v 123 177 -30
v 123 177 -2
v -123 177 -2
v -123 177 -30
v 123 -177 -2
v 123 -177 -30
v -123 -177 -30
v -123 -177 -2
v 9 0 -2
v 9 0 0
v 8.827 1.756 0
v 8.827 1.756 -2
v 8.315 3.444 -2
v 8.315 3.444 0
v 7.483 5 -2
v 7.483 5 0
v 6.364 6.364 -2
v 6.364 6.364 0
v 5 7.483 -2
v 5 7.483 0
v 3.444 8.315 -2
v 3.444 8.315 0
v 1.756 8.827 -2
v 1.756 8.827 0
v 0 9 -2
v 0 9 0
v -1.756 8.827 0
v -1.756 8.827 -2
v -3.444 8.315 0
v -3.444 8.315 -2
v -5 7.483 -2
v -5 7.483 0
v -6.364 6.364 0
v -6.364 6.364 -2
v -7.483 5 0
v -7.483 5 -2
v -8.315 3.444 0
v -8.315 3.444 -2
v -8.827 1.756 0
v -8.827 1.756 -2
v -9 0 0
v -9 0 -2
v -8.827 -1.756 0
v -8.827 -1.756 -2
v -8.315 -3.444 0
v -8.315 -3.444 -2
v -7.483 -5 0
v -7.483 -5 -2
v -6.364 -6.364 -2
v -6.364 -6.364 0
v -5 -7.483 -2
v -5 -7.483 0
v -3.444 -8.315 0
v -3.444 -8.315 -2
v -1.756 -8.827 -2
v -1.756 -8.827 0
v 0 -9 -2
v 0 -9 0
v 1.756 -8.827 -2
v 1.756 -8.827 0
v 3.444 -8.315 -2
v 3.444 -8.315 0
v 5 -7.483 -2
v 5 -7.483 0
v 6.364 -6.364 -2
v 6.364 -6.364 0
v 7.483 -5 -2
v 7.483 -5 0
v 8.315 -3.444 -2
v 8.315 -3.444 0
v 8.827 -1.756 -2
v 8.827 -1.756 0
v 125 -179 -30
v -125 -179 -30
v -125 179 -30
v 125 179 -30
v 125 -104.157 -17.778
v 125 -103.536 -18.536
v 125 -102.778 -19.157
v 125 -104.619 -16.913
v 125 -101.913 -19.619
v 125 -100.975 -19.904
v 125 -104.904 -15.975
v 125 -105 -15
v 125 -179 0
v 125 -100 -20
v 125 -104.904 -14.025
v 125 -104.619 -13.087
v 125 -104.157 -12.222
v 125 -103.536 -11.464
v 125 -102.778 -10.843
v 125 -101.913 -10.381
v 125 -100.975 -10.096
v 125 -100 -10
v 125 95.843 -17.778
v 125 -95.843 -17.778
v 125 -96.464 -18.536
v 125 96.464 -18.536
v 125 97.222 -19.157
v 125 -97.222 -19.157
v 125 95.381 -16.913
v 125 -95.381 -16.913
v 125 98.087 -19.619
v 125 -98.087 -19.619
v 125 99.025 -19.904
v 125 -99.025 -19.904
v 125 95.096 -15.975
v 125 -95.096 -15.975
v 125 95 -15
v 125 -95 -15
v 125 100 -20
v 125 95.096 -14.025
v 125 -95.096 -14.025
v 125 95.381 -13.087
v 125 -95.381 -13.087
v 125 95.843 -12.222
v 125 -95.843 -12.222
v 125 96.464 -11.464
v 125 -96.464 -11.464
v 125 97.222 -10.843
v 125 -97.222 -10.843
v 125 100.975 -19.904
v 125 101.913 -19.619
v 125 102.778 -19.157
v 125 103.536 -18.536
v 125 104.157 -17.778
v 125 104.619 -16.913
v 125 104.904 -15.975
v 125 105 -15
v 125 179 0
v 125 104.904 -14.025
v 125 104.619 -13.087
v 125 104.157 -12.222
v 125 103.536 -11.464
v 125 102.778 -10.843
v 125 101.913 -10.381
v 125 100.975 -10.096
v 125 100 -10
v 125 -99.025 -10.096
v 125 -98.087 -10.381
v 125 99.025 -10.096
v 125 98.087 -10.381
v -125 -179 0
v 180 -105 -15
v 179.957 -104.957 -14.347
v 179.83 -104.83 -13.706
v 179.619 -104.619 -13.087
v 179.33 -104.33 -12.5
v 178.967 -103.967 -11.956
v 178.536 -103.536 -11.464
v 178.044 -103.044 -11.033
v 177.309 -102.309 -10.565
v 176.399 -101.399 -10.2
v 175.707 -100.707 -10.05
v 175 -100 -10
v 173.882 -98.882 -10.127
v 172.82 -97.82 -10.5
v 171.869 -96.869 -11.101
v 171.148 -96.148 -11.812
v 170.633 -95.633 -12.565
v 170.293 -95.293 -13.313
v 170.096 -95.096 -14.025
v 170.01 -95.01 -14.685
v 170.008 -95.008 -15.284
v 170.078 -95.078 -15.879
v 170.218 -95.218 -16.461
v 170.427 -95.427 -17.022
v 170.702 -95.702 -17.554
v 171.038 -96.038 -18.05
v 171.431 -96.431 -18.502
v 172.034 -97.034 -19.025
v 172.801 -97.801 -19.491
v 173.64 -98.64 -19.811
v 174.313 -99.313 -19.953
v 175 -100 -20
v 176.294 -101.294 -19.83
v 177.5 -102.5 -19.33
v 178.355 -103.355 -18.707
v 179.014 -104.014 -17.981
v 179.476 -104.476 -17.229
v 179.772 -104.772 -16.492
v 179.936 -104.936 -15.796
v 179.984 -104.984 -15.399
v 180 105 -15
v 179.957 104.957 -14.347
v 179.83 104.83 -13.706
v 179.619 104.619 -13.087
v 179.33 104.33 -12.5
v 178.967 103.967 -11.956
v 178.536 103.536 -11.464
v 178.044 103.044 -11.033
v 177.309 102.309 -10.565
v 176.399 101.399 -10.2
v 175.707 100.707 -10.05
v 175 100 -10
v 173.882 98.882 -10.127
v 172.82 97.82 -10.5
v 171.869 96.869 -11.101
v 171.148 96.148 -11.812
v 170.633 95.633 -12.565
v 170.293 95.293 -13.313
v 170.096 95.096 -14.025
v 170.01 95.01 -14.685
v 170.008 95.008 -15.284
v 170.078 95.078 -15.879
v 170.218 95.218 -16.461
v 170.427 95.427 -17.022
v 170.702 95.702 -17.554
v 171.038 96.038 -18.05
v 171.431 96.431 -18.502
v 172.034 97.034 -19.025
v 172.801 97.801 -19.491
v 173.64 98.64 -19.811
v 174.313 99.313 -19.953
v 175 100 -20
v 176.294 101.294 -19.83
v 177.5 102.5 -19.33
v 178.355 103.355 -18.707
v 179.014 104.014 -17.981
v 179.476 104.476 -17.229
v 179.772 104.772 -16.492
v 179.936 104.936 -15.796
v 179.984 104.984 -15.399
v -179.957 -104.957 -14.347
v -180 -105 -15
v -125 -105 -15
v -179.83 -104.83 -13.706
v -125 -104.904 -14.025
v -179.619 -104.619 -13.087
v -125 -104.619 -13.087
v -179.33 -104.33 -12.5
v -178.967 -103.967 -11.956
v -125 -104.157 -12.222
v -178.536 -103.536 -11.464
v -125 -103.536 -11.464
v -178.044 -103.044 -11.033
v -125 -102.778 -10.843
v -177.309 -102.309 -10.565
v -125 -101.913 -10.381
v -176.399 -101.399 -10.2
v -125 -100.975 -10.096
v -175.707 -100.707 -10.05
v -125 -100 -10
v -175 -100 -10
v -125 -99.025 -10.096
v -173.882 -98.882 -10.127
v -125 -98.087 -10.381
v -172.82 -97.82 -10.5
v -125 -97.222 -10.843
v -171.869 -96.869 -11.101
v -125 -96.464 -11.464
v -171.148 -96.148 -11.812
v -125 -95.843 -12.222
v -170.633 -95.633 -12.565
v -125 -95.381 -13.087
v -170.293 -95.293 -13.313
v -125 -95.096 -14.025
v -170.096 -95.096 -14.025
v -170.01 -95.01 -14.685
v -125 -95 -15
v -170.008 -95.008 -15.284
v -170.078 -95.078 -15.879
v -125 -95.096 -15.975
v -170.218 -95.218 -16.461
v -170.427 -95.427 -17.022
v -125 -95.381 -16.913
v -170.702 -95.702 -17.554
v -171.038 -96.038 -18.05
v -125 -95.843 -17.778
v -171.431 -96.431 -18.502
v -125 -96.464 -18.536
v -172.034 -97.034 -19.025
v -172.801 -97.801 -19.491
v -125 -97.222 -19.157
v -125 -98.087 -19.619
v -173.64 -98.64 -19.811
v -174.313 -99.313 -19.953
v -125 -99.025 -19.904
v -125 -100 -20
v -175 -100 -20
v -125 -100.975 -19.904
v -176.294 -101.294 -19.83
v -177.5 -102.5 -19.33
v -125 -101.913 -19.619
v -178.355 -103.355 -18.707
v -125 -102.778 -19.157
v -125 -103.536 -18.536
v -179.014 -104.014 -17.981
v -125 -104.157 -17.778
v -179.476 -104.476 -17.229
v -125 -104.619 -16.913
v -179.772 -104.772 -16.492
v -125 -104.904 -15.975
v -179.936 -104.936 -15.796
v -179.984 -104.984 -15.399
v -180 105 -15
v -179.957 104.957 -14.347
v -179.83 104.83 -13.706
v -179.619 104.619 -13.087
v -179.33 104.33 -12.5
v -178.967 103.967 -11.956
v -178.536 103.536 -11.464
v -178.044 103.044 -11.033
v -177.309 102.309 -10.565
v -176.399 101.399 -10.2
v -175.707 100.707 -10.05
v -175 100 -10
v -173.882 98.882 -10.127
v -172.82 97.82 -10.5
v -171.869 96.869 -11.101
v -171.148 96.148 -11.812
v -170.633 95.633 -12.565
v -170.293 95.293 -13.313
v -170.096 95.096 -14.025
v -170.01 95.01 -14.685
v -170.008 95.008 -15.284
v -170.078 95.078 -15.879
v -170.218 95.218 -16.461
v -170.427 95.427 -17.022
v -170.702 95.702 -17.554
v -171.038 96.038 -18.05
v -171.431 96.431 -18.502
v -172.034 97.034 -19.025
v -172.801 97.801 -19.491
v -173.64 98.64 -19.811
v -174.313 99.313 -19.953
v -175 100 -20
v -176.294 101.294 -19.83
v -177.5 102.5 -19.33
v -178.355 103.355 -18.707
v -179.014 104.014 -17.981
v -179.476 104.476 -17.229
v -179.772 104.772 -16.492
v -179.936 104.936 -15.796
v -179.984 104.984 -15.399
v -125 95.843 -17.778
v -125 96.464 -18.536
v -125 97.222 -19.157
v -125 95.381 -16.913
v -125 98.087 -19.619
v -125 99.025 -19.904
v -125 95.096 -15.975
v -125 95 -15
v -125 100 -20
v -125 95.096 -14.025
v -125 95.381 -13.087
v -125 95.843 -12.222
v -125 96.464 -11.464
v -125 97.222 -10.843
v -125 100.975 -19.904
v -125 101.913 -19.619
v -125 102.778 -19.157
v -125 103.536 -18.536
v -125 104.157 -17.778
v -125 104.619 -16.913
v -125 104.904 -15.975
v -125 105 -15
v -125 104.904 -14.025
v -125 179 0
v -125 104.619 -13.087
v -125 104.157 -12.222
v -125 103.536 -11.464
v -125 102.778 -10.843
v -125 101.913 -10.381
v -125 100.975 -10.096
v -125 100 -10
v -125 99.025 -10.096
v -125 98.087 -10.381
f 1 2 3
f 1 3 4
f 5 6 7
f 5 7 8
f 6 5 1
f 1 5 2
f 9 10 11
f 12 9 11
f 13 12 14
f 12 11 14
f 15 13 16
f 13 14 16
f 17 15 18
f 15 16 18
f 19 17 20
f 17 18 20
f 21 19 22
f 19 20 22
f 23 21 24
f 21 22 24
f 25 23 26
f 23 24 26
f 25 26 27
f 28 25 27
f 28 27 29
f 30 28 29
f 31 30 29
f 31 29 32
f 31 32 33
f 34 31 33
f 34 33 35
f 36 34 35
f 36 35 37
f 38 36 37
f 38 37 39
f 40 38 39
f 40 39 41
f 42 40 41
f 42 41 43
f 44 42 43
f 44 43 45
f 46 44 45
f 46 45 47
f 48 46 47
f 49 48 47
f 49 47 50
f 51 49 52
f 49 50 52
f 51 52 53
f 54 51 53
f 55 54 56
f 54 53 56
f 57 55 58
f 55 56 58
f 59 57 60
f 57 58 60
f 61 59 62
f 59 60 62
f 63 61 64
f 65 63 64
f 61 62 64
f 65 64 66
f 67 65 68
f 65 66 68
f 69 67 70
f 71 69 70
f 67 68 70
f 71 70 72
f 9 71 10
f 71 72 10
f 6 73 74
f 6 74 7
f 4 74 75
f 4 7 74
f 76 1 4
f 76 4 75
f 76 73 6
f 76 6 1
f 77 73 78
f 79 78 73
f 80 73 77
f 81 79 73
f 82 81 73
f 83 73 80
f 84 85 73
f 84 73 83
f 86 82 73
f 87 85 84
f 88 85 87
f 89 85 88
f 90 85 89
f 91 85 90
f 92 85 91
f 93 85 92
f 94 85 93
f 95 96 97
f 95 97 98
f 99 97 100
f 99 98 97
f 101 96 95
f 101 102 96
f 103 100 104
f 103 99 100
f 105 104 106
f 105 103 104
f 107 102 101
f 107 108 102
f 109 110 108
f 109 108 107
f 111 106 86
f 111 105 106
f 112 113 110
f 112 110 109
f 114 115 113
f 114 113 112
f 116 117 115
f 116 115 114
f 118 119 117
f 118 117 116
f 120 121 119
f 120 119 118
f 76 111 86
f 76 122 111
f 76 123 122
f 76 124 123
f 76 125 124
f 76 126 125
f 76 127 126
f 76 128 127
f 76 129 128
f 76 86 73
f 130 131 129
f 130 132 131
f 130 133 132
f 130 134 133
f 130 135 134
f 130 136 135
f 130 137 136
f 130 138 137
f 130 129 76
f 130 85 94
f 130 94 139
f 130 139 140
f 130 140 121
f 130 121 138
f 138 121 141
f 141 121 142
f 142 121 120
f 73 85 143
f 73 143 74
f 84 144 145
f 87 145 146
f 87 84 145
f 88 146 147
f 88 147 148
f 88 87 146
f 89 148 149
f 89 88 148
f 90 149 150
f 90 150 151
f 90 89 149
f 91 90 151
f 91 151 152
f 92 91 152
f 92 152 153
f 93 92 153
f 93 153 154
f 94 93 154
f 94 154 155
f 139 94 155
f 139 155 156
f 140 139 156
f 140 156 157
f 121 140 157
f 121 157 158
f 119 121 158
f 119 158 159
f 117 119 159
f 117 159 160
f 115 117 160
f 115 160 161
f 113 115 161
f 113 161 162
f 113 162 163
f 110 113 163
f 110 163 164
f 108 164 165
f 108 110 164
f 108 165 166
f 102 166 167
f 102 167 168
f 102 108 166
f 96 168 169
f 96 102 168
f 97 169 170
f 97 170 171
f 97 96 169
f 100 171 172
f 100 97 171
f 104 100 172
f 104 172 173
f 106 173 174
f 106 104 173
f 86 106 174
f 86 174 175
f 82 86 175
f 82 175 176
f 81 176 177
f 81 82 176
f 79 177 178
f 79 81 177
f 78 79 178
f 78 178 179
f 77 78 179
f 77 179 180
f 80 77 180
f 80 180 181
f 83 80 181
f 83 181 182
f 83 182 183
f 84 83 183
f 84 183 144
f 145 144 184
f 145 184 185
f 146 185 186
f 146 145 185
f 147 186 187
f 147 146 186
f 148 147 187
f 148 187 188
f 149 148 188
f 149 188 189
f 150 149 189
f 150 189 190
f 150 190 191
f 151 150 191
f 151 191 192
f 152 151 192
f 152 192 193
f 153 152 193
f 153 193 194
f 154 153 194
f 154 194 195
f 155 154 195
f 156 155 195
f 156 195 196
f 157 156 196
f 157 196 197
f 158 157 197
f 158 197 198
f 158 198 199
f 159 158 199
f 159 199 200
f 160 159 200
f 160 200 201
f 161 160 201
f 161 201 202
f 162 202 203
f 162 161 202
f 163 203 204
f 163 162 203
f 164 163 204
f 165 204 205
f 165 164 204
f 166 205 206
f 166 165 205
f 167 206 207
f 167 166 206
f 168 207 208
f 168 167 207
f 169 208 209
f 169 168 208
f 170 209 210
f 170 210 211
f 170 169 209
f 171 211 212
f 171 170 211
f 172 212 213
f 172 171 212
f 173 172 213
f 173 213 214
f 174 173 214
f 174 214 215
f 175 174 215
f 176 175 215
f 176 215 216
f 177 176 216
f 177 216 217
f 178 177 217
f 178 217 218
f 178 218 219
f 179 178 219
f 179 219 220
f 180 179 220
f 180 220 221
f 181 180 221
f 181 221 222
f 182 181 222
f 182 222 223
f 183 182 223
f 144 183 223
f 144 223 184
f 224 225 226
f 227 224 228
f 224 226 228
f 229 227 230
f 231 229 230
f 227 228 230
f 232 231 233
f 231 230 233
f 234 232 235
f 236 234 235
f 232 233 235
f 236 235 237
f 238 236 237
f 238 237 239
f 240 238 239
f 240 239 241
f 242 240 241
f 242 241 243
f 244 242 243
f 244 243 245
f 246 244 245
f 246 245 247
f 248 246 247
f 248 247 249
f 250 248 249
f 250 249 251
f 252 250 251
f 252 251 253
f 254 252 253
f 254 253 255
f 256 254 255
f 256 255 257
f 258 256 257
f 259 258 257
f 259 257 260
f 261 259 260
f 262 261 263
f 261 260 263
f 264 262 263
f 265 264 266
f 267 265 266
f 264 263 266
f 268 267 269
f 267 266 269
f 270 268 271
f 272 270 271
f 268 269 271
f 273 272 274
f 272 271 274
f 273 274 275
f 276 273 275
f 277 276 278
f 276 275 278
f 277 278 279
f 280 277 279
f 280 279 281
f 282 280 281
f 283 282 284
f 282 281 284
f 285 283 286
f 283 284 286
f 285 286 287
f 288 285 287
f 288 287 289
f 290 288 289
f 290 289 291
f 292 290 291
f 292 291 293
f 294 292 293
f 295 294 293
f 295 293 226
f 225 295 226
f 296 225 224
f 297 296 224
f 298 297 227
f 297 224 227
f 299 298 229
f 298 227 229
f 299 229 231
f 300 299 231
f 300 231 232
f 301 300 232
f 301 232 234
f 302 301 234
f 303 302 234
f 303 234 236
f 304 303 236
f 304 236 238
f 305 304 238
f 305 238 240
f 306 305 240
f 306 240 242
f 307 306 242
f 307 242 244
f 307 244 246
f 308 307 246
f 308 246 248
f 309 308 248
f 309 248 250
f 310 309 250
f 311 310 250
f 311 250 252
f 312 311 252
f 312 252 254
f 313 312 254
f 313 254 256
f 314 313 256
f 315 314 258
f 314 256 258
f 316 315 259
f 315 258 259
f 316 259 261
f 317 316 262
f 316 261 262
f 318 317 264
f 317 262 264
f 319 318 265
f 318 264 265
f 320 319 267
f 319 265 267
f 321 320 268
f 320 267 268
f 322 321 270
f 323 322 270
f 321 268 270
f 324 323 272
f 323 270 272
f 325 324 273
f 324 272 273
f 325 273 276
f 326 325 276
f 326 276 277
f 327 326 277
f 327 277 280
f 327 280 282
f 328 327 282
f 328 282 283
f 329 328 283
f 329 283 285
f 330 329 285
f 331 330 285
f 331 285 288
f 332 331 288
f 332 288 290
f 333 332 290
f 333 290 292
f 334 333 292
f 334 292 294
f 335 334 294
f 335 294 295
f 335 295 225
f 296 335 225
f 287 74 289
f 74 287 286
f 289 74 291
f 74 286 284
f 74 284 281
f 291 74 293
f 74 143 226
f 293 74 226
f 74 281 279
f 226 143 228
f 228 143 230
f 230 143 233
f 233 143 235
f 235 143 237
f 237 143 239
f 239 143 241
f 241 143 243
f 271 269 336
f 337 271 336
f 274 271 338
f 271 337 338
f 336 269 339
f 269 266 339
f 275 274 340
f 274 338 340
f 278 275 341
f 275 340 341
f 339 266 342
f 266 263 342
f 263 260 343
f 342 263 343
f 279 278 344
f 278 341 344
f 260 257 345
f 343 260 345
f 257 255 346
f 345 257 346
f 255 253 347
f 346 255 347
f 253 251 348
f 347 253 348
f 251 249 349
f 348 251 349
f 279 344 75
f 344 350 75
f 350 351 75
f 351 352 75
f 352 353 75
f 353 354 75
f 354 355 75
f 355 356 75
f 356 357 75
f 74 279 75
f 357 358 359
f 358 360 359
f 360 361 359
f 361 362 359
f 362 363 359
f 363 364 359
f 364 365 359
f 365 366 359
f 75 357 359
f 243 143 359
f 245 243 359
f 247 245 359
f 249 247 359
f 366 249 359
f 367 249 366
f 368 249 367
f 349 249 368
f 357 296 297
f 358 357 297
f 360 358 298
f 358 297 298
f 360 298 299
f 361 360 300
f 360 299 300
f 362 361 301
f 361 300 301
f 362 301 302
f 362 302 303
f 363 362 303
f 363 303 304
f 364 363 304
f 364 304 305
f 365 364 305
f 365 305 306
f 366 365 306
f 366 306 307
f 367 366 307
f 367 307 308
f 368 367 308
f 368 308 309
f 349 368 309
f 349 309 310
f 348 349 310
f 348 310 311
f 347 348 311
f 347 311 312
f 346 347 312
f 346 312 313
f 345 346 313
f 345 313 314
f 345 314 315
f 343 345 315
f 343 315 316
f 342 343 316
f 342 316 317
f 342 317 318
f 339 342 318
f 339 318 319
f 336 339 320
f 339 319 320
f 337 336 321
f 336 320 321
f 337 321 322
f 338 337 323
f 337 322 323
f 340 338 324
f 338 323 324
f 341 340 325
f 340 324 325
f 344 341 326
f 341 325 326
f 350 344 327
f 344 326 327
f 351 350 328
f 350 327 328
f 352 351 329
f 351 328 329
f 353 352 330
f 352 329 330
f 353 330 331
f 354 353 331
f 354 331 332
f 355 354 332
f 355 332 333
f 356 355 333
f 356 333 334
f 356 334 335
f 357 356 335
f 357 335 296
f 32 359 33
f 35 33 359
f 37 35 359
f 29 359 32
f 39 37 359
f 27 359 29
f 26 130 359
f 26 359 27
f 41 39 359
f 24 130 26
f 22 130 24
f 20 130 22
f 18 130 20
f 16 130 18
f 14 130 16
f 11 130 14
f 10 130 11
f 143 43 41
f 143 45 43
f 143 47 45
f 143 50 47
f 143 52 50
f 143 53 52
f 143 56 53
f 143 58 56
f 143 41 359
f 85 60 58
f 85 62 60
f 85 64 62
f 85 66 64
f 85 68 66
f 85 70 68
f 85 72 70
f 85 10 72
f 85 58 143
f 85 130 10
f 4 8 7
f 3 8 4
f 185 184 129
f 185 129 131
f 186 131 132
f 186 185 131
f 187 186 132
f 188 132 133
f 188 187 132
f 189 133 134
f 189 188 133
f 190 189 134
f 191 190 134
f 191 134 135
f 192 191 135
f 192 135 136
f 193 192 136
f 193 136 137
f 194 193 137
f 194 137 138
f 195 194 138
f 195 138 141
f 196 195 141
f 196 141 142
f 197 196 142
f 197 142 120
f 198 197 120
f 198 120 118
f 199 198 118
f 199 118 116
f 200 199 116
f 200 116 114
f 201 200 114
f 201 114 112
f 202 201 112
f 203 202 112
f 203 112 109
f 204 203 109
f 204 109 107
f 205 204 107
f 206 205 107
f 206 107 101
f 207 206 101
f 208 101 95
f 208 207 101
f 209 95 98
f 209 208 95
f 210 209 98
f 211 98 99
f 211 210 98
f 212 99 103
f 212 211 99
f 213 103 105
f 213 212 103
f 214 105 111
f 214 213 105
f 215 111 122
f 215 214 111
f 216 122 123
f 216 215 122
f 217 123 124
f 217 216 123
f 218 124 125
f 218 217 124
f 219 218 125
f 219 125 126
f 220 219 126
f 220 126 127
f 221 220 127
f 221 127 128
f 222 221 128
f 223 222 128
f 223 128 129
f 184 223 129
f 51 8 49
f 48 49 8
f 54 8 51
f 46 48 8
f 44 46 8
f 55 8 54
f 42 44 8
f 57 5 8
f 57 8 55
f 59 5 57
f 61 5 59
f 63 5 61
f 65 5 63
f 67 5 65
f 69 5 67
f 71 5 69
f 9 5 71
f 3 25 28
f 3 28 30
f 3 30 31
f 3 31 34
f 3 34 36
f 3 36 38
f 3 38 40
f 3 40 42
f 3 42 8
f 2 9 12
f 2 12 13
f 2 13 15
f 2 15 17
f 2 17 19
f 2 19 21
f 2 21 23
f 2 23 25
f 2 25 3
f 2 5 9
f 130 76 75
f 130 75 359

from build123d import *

# Parameters (mm, degrees)
F1_DEPTH  = 125
F4_DEPTH  = 2
F10_R     = 9
F11_DEPTH = 25


with BuildPart() as f1:
    # F0 (on Right) → F1 (new body)
    with BuildSketch(Plane.YZ):
        Polygon((179, 0), (0, 0), (0, -2), (177, -2), (177, -30), (179, -30), align=None)
        Polygon((0, -2), (0, 0), (-179, 0), (-179, -30), (-177, -30), (-177, -2), align=None)
    extrude(amount=F1_DEPTH)

    # F3 (on offset) → F4 (join)
    with BuildSketch(Plane.YZ.offset(125)):
        Polygon((179, 0), (0, 0), (-179, 0), (-179, -30), (179, -30), align=None)
    extrude(amount=-F4_DEPTH)

    # F8: sweep along a path in F7
    with BuildLine(Plane.XY.offset(-15)) as f8_path:
        Line((125, 100), (175, 100))
        Line((175, 100), (175, -100))
        Line((175, -100), (125, -100))
    # F5 (on offset) → F8 (sweep)
    with BuildSketch(Plane.YZ.offset(125)):
        with BuildLine():
            ThreePointArc((95, -15), (100, -20), (105, -15))
            ThreePointArc((105, -15), (100, -10), (95, -15))
        make_face()
    sweep(path=f8_path.line, transition=Transition.RIGHT)

    # F9: F1 across face


with BuildPart() as f1_1:
    add(f1.part)
    add(f1.part.mirror(Plane(origin=(0, 0, -3.0289855072), x_dir=(0, 1, 0), z_dir=(-1, 0, 0))))

    # F10 (on Top) → F11 (cut)
    with BuildSketch(Plane.XY):
        Circle(F10_R)
    extrude(amount=-F11_DEPTH, mode=Mode.SUBTRACT)


solid = f1_1.part
